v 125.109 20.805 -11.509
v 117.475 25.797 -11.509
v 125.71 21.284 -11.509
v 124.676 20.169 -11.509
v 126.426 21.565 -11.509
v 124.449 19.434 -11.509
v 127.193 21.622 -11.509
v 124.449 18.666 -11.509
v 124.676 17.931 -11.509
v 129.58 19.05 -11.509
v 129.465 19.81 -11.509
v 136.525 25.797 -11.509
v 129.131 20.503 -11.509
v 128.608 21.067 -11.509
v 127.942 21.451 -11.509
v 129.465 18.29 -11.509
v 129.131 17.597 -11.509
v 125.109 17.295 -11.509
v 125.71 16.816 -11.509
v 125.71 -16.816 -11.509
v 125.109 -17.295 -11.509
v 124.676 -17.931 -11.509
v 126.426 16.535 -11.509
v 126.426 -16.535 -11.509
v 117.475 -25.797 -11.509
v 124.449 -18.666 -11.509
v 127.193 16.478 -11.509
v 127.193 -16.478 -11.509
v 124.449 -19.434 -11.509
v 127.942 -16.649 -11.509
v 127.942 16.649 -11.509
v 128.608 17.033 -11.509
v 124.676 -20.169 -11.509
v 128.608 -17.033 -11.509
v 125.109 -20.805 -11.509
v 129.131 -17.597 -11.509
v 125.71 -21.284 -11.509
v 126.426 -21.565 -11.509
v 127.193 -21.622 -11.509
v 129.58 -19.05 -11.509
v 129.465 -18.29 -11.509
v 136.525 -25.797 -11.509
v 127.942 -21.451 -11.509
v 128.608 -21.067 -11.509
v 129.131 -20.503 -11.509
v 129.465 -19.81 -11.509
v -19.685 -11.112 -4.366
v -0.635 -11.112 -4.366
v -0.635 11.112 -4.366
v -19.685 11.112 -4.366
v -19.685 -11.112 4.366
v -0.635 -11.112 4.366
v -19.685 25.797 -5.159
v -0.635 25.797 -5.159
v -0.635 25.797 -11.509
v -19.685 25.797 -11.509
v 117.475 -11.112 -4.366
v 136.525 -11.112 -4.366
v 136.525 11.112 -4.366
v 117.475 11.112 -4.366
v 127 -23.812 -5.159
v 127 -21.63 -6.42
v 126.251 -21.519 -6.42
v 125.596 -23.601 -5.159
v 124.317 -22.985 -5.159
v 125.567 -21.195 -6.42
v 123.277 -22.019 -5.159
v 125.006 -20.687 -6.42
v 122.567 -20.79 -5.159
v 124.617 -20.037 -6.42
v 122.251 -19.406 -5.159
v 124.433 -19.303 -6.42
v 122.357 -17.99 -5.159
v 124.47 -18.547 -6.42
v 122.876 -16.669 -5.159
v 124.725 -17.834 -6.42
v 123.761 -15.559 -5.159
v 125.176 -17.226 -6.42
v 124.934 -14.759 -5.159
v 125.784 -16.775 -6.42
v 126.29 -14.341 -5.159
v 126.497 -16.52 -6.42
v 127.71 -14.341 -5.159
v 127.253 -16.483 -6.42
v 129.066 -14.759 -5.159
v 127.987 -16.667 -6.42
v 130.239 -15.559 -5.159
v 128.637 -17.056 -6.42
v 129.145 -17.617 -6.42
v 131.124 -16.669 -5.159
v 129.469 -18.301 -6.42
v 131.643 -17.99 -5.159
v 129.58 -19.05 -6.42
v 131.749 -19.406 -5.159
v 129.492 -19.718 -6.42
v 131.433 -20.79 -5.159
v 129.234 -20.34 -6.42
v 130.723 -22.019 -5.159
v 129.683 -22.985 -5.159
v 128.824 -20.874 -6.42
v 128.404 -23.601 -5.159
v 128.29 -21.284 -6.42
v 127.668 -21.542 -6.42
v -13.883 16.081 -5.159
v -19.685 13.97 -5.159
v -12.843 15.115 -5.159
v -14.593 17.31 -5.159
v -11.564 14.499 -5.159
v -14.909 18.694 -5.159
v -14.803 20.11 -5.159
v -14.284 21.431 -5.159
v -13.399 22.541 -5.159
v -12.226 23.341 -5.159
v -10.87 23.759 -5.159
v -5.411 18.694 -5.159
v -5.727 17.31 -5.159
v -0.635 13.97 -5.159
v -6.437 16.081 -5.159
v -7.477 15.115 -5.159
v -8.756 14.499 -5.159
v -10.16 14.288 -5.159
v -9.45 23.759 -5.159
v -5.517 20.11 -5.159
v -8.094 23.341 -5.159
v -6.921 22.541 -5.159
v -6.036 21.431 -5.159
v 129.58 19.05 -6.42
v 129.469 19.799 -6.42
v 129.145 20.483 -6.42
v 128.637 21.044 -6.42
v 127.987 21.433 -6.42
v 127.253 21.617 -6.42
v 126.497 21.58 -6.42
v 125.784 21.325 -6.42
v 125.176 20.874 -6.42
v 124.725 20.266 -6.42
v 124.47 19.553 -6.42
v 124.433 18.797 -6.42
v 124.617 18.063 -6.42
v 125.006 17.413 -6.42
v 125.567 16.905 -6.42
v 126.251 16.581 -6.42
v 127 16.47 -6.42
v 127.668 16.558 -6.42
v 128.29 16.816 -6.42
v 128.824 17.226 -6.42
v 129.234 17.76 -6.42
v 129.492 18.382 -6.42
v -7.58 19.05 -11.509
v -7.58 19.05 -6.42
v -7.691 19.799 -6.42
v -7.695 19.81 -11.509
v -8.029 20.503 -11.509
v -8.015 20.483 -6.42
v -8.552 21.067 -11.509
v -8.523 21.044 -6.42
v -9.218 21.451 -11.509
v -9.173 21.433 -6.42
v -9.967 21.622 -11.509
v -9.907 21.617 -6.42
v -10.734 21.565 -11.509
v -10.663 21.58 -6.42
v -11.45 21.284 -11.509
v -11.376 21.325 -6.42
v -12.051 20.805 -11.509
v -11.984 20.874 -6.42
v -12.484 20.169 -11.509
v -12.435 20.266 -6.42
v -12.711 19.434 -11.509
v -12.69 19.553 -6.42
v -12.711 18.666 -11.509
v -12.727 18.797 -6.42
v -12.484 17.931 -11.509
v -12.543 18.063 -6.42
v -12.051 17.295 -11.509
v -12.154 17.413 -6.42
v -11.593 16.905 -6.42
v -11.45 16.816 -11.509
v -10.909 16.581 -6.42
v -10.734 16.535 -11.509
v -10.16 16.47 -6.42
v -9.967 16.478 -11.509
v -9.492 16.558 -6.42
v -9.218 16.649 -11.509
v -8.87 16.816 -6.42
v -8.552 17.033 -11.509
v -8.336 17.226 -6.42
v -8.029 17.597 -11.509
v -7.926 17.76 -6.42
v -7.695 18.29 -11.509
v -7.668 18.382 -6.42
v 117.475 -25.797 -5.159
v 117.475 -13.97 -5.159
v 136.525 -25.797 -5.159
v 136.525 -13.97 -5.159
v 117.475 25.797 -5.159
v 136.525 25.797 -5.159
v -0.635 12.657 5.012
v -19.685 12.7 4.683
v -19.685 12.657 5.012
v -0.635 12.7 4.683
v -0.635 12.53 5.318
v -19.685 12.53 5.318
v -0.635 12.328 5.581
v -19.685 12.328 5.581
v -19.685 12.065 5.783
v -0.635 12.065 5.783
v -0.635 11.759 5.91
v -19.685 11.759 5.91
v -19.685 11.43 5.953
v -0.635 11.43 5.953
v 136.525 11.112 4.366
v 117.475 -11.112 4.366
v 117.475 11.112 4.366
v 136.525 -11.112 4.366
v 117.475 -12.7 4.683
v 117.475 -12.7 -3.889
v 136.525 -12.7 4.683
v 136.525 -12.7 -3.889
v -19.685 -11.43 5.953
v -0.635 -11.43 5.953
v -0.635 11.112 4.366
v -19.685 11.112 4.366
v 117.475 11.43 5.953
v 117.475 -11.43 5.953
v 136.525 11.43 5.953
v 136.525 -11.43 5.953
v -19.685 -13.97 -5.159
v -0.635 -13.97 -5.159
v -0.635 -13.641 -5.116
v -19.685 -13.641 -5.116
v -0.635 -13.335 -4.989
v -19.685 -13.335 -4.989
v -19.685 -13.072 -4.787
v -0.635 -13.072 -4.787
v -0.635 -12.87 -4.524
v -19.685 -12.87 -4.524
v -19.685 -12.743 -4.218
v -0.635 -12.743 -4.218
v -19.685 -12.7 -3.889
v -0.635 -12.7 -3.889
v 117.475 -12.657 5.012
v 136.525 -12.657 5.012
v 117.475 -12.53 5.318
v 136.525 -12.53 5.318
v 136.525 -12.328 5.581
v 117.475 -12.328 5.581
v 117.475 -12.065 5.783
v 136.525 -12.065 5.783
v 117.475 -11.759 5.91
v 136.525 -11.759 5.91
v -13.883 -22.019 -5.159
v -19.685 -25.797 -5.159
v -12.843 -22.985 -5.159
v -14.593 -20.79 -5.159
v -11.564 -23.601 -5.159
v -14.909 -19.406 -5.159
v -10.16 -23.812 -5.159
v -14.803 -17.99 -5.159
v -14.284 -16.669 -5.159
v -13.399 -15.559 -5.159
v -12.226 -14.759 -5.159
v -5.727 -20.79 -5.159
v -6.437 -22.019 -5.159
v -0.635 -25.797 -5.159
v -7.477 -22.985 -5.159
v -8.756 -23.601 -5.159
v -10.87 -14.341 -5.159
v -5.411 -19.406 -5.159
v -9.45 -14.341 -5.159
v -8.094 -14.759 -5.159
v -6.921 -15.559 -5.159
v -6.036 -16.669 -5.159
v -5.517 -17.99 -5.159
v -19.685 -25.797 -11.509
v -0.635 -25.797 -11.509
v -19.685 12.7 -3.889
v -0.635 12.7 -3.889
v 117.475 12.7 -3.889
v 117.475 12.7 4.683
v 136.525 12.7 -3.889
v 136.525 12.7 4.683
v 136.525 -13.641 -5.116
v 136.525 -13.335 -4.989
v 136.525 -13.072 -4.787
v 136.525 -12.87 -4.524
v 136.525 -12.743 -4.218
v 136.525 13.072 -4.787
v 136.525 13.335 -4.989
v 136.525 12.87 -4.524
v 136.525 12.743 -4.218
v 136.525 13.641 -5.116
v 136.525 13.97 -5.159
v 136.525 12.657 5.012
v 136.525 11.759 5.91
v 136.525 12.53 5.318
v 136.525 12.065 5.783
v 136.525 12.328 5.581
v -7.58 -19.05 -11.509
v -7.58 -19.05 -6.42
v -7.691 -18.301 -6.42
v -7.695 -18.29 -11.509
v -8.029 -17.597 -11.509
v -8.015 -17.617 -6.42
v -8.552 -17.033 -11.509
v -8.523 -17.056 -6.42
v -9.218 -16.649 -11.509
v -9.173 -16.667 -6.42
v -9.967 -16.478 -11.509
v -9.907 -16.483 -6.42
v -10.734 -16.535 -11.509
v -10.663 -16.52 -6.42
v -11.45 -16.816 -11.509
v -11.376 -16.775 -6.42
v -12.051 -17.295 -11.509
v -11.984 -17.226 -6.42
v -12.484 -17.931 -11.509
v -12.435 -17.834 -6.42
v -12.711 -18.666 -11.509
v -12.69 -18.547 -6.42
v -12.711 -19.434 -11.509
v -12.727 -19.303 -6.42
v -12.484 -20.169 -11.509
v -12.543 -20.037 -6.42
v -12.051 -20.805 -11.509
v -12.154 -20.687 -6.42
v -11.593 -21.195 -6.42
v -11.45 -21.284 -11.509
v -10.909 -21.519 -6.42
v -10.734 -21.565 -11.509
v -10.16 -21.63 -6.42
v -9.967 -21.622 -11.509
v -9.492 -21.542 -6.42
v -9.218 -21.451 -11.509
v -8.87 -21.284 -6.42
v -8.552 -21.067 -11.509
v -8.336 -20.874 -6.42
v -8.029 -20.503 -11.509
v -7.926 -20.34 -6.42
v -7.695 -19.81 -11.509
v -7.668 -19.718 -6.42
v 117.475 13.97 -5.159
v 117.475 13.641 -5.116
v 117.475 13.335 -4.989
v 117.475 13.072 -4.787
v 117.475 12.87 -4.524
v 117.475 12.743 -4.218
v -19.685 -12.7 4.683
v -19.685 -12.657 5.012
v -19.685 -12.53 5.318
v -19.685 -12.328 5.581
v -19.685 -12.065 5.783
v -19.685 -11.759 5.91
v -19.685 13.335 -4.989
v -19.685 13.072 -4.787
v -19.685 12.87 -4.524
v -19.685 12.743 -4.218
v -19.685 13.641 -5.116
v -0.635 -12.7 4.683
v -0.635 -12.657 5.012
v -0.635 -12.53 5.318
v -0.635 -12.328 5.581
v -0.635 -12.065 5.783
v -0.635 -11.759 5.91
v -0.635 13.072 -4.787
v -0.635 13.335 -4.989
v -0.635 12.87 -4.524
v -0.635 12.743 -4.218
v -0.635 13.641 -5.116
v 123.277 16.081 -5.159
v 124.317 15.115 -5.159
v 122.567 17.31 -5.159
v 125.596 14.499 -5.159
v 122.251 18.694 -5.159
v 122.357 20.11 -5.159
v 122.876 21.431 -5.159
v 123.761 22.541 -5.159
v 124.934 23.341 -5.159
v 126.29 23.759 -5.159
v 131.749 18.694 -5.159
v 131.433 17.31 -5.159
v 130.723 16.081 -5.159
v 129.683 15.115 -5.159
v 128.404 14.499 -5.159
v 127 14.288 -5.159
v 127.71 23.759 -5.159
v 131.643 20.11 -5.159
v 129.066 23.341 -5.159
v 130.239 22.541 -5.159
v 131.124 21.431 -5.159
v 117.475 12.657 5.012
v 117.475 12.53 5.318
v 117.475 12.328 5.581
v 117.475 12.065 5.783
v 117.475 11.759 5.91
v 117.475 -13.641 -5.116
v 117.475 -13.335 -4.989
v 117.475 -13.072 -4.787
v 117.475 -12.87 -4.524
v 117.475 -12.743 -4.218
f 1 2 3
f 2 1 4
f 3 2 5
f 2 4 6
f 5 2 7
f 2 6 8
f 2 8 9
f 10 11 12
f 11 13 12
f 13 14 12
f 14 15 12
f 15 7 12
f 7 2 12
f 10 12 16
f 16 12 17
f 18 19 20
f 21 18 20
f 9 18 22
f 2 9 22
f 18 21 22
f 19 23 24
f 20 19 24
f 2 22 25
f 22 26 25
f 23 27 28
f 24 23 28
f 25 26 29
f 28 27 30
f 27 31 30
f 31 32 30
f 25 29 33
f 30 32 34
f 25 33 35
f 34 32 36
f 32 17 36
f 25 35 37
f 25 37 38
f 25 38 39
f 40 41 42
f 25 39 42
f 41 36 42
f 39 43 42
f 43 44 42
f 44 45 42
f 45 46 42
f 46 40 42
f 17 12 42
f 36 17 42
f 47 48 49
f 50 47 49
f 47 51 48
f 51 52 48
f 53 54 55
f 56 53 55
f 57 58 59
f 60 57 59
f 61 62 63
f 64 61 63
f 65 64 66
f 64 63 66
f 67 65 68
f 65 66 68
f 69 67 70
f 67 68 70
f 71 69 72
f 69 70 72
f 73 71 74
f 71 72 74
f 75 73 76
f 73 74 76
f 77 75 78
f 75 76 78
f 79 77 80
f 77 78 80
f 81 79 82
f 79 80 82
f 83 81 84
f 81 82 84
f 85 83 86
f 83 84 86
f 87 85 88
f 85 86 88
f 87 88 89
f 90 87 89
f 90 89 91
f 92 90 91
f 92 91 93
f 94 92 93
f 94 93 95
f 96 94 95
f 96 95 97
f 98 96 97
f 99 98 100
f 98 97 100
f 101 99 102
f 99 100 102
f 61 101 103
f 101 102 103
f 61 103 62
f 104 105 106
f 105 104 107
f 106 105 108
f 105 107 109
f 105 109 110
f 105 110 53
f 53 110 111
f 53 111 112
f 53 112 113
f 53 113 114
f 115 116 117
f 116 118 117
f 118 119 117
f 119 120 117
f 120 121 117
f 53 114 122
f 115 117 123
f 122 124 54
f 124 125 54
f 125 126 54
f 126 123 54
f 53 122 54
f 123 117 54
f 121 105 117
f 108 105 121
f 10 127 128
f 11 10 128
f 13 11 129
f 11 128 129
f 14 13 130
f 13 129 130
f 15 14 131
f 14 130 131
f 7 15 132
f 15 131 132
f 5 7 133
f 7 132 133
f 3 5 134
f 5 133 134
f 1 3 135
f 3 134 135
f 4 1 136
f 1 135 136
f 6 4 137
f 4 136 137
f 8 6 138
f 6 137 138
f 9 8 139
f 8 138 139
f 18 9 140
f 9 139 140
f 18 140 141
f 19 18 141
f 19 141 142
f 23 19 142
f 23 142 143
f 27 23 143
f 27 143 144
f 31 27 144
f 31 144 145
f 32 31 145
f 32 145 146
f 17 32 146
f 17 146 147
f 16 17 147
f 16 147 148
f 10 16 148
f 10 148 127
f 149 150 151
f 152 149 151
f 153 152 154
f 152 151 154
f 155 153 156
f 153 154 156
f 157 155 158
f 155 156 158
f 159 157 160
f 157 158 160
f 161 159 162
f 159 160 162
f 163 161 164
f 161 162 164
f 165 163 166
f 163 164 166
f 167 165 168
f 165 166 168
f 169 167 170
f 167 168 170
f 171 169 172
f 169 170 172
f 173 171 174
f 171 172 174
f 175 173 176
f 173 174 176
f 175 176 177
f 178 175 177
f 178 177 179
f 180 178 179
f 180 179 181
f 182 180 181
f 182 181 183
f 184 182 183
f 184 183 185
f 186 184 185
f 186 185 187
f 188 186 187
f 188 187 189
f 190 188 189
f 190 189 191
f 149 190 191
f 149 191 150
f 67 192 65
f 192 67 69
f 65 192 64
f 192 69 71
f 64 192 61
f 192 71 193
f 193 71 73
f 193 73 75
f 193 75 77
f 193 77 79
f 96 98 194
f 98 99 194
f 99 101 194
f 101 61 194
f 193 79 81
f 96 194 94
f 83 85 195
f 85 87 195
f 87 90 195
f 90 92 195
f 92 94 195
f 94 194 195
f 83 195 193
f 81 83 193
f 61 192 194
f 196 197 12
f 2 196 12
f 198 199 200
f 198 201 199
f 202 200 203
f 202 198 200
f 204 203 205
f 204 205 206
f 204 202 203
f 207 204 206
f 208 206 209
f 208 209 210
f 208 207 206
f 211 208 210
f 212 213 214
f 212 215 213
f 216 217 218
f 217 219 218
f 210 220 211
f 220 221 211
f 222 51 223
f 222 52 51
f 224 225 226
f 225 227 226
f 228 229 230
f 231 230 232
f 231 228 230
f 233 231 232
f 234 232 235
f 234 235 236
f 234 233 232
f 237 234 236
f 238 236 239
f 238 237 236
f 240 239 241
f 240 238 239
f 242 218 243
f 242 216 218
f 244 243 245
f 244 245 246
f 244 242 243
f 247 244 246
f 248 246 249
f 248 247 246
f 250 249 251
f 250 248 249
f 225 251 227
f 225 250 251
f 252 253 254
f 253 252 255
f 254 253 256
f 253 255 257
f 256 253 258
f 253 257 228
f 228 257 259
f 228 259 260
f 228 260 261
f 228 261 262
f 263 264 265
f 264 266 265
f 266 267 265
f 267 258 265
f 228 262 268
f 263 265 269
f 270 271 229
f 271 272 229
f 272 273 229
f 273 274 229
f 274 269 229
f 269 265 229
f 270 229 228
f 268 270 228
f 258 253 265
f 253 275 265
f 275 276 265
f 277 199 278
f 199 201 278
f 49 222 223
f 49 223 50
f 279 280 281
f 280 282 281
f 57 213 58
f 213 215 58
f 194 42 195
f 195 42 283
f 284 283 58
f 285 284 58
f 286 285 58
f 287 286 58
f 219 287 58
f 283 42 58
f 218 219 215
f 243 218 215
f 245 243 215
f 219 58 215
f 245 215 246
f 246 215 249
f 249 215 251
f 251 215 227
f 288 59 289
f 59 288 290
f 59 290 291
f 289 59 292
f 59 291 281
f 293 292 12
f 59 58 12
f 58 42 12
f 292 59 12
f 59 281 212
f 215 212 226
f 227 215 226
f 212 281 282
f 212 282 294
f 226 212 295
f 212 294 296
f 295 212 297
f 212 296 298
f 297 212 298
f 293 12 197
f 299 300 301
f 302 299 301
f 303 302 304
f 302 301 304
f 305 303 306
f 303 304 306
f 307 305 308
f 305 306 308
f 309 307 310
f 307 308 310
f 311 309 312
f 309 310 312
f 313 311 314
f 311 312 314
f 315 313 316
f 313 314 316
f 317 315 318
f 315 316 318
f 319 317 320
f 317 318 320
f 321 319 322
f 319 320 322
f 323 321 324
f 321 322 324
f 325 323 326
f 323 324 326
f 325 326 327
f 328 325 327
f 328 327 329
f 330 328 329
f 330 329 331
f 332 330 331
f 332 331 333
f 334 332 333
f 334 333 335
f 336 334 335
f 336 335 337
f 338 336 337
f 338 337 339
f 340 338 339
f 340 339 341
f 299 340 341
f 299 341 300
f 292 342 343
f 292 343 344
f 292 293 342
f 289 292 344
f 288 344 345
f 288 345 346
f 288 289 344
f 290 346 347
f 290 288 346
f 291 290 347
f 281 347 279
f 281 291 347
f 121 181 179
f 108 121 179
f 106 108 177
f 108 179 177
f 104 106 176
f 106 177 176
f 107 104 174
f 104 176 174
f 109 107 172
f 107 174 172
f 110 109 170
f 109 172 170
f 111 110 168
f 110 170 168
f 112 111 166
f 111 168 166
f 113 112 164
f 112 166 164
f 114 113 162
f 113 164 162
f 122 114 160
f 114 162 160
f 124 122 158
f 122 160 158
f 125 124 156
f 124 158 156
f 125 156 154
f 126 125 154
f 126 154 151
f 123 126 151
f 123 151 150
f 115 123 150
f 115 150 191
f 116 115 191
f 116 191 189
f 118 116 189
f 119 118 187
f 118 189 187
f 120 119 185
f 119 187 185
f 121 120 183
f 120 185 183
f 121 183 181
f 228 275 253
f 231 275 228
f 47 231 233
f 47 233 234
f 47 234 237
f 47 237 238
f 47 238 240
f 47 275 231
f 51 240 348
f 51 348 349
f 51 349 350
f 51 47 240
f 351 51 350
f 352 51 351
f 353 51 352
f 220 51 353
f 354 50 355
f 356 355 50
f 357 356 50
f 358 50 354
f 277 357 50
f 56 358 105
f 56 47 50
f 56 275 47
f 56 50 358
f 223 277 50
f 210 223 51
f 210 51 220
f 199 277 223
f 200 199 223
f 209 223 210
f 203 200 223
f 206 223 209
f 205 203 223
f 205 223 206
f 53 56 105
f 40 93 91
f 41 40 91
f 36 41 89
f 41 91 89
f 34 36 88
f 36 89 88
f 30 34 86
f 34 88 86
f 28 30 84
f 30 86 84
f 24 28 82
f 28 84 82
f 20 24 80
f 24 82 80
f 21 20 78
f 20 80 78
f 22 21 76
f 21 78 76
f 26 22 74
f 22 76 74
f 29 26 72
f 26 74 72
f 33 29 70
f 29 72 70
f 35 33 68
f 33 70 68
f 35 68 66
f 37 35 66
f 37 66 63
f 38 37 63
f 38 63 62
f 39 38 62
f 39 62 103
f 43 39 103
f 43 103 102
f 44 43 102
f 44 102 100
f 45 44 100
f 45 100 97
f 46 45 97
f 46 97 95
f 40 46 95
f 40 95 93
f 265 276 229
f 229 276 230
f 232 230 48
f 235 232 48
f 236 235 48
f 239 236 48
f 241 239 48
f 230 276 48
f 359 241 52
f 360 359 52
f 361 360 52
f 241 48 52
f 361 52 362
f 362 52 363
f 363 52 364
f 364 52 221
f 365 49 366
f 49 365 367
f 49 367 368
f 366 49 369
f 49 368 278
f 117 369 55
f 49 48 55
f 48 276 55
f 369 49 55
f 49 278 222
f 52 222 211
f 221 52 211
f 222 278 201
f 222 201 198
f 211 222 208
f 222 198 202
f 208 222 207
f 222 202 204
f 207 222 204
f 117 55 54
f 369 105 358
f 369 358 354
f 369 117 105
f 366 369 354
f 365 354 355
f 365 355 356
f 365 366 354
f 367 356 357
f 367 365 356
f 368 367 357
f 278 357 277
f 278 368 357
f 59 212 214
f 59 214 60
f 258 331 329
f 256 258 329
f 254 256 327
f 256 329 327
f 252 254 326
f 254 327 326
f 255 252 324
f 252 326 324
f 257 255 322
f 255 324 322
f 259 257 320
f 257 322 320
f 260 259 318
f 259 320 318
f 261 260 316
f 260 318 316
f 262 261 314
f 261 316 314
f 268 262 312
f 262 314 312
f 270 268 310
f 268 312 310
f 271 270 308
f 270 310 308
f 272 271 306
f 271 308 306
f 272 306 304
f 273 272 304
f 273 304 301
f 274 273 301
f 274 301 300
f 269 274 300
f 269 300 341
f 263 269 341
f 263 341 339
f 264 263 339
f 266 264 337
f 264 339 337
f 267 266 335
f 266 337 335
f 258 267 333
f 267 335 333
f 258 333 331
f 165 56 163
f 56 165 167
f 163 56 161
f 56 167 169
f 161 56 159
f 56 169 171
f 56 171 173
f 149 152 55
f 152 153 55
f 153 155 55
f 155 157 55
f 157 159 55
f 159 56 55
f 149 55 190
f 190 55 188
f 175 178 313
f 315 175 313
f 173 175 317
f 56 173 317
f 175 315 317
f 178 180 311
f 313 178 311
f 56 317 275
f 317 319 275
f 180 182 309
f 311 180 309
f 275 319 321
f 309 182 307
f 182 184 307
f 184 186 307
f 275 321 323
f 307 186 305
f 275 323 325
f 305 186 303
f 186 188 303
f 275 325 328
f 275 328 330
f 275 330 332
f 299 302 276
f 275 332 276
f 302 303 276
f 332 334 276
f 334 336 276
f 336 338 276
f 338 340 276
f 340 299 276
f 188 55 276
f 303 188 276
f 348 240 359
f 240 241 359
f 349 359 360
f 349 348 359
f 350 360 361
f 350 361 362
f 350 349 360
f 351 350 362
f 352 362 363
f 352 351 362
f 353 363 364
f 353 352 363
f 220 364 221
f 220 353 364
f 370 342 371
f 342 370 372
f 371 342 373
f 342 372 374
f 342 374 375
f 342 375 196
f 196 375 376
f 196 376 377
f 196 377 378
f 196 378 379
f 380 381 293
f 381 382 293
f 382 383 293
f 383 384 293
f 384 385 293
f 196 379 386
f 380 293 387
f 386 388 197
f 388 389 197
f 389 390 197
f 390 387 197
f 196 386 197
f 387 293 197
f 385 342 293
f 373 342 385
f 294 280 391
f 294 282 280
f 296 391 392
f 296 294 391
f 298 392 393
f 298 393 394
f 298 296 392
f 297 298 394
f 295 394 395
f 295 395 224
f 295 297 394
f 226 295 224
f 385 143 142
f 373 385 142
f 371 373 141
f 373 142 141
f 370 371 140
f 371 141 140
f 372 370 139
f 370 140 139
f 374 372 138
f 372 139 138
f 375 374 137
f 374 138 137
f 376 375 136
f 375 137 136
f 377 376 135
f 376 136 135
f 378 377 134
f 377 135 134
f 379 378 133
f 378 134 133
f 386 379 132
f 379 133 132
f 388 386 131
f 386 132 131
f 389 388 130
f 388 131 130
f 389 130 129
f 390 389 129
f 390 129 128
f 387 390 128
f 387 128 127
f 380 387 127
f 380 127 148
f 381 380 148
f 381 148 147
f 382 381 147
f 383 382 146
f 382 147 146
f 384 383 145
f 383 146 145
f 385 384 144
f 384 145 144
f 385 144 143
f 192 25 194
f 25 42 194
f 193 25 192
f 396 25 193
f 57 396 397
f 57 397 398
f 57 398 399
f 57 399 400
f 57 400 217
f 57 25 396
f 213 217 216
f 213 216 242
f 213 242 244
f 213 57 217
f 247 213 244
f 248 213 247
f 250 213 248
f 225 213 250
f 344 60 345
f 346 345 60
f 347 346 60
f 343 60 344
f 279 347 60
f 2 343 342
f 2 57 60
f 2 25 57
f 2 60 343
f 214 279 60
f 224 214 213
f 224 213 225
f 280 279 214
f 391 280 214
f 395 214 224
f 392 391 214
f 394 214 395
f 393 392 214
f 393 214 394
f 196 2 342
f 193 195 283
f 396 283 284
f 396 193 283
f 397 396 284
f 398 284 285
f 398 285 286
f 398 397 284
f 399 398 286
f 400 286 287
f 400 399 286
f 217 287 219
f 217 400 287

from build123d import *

# Parameters (mm, degrees)
BOSS_EXTRUDE1_DEPTH      = 3.175
BOSS_EXTRUDE1_DEPTH_BACK = 3.175
SKETCH4_W                = 203.2
SKETCH4_H                = 19.05
CHAMFER1_SIZE            = 1.27
SKETCH5_R                = 7.9375
BOSS_EXTRUDE2_DEPTH      = 12.7
BOSS_EXTRUDE3_DEPTH      = 3.175
CHAMFER2_SIZE            = 1.27
FILLET1_R                = 0.635
FILLET2_R                = 0.254
SKETCH7_W                = 8.73125
SKETCH7_H                = 22.225
BOSS_EXTRUDE4_DEPTH      = 9.525
SKETCH8_R                = 2.5796875
CUT_EXTRUDE1_DEPTH       = 157.452333308
FILLET4_R                = 1.27
PATTERN_LINEAR_1_COUNT   = 2
PATTERN_LINEAR_1_PITCH   = 137.16


with BuildPart() as part:
    # Sketch4 → Boss-Extrude1 (new, two sides: drawn at the far end of the back side and taken through both)
    with BuildSketch(Plane.XY.offset(-BOSS_EXTRUDE1_DEPTH_BACK)):
        with Locations((-50.8, 0)):
            Rectangle(SKETCH4_W, SKETCH4_H)
    extrude(amount=BOSS_EXTRUDE1_DEPTH + BOSS_EXTRUDE1_DEPTH_BACK)

    # Chamfer1
    chamfer1_edges = [part.edges().sort_by_distance(p)[0] for p in [
        (50.8, 0, 3.175),
        (50.8, 0, -3.175),
        (50.8, 9.525, 0),
        (50.8, -9.525, 0),
    ]]
    chamfer(chamfer1_edges, length=CHAMFER1_SIZE)

    # Sketch5 → Boss-Extrude2 (add)
    with BuildSketch(Plane.XY.offset(3.175)):
        with Locations((-142.875, 0)):
            Circle(SKETCH5_R)
    extrude(amount=BOSS_EXTRUDE2_DEPTH)

    # Sketch6 → Boss-Extrude3 (add)
    with BuildSketch(Plane.XY.offset(15.875)):
        Polygon((-151.892, -9.525), (-133.858, -9.525), (-133.35, -9.017), (-133.35, 9.017), (-133.858, 9.525), (-151.892, 9.525), (-152.4, 9.017), (-152.4, -9.017), align=None)
    extrude(amount=BOSS_EXTRUDE3_DEPTH)

    # Chamfer2
    # the kernel refuses this chamfer: 1.27 mm, written as the material it takes off along each edge
    with BuildSketch(Plane(origin=(-130.591962605, 9.525, 19.05), x_dir=(0, -0.9996219169112966, 0.027495876610587302), z_dir=(-1, 0, 0)), Plane(origin=(-133.35, -12.283037395, 19.05), x_dir=(-0.9996219169112966, 0, 0.027495876610586965), z_dir=(0, 1, 0)), Plane(origin=(-152.4, 12.283037395, 19.05), x_dir=(0.9996219169112966, 0, 0.027495876610586965), z_dir=(0, -1, 0))) as chamfer2_piece_1:
        Polygon((CHAMFER2_SIZE * 0.999621916911, -CHAMFER2_SIZE * 0.0274958766106), (-CHAMFER2_SIZE * 0.0274958766106, -CHAMFER2_SIZE * 0.999621916911), (0, 0), align=None)
    extrude(amount=24.566074789, mode=Mode.SUBTRACT)
    with BuildSketch(Plane(origin=(-155.158037395, -9.525, 19.05), x_dir=(0, -0.02749587661058591, -0.9996219169112968), z_dir=(1, 0, 0))) as chamfer2_piece_2:
        Polygon((CHAMFER2_SIZE * 0.999621916911, CHAMFER2_SIZE * 0.0274958766106), (-CHAMFER2_SIZE * 0.0274958766106, CHAMFER2_SIZE * 0.999621916911), (0, 0), align=None)
    extrude(amount=24.566074789, mode=Mode.SUBTRACT)

    # Fillet1
    fillet1_edges = [part.edges().sort_by_distance(p)[0] for p in [
        (-150.8125, 0, 3.175),
        (-150.8125, 0, 15.875),
    ]]
    fillet(fillet1_edges, radius=FILLET1_R)

    # Fillet2
    fillet2_edges = [part.edges().sort_by_distance(p)[0] for p in [
        (-152.146, 9.271, 15.875),
        (-152.4, 0, 15.875),
        (-152.146, -9.271, 15.875),
        (-142.875, -9.525, 15.875),
        (-133.604, -9.271, 15.875),
        (-133.35, 0, 15.875),
        (-133.604, 9.271, 15.875),
        (-142.875, 9.525, 15.875),
    ]]
    fillet(fillet2_edges, radius=FILLET2_R)


with BuildPart() as body_2:
    # Sketch7 → Boss-Extrude4 (new, symmetric)
    with BuildSketch(Plane(origin=(127, 0, 0), x_dir=(0, 0, -1), z_dir=(1, 0, 0))):
        Polygon((11.509375, 25.796875), (11.509375, -25.796875), (5.159375, -25.796875), (5.159375, -12.7), (-5.953125, -12.7), (-5.953125, 12.7), (5.159375, 12.7), (5.159375, 25.796875), align=None)
        Rectangle(SKETCH7_W, SKETCH7_H, mode=Mode.SUBTRACT)
    extrude(amount=BOSS_EXTRUDE4_DEPTH, both=True)

    # Sketch8 → Cut-Extrude1 (cut, through all)
    with BuildSketch(Plane.XY.offset(-5.159375)):
        with Locations((127, 19.05)):
            Circle(SKETCH8_R)
        with Locations((127, -19.05)):
            Circle(SKETCH8_R)
    extrude(amount=-CUT_EXTRUDE1_DEPTH, mode=Mode.SUBTRACT)

    # Cut-Extrude2 cone 1 section (through the dimple's axis) → Cut-Extrude2 (revolve, cut)
    with BuildSketch(Plane(origin=(127, 19.05, -5.159375), x_dir=(0, -1, 0), z_dir=(1, 0, 0))):
        Polygon((0, 0), (4.7625, 0), (0, 2.749630657), align=None)
    revolve(axis=Axis((127, 19.05, -5.159375), (0, 0, -1)), mode=Mode.SUBTRACT)

    # Cut-Extrude3 cone 1 section (through the dimple's axis) → Cut-Extrude3 (revolve, cut)
    with BuildSketch(Plane(origin=(127, -19.05, -5.159375), x_dir=(0, -1, 0), z_dir=(1, 0, 0))):
        Polygon((0, 0), (4.7625, 0), (0, 2.749630657), align=None)
    revolve(axis=Axis((127, -19.05, -5.159375), (0, 0, -1)), mode=Mode.SUBTRACT)

    # Fillet4
    fillet4_edges = [body_2.edges().sort_by_distance(p)[0] for p in [
        (127, -12.7, -5.159375),
        (127, -12.7, 5.953125),
        (127, 12.7, 5.953125),
        (127, 12.7, -5.159375),
    ]]
    fillet(fillet4_edges, radius=FILLET4_R)


with BuildPart() as pattern_linear_1_1:
    # 阵列(线性)1: pattern copy
    add(body_2.part.moved(Location(Vector(-1, 0, 0) * (1 * PATTERN_LINEAR_1_PITCH))))


solid = Compound([body_2.part, pattern_linear_1_1.part])
